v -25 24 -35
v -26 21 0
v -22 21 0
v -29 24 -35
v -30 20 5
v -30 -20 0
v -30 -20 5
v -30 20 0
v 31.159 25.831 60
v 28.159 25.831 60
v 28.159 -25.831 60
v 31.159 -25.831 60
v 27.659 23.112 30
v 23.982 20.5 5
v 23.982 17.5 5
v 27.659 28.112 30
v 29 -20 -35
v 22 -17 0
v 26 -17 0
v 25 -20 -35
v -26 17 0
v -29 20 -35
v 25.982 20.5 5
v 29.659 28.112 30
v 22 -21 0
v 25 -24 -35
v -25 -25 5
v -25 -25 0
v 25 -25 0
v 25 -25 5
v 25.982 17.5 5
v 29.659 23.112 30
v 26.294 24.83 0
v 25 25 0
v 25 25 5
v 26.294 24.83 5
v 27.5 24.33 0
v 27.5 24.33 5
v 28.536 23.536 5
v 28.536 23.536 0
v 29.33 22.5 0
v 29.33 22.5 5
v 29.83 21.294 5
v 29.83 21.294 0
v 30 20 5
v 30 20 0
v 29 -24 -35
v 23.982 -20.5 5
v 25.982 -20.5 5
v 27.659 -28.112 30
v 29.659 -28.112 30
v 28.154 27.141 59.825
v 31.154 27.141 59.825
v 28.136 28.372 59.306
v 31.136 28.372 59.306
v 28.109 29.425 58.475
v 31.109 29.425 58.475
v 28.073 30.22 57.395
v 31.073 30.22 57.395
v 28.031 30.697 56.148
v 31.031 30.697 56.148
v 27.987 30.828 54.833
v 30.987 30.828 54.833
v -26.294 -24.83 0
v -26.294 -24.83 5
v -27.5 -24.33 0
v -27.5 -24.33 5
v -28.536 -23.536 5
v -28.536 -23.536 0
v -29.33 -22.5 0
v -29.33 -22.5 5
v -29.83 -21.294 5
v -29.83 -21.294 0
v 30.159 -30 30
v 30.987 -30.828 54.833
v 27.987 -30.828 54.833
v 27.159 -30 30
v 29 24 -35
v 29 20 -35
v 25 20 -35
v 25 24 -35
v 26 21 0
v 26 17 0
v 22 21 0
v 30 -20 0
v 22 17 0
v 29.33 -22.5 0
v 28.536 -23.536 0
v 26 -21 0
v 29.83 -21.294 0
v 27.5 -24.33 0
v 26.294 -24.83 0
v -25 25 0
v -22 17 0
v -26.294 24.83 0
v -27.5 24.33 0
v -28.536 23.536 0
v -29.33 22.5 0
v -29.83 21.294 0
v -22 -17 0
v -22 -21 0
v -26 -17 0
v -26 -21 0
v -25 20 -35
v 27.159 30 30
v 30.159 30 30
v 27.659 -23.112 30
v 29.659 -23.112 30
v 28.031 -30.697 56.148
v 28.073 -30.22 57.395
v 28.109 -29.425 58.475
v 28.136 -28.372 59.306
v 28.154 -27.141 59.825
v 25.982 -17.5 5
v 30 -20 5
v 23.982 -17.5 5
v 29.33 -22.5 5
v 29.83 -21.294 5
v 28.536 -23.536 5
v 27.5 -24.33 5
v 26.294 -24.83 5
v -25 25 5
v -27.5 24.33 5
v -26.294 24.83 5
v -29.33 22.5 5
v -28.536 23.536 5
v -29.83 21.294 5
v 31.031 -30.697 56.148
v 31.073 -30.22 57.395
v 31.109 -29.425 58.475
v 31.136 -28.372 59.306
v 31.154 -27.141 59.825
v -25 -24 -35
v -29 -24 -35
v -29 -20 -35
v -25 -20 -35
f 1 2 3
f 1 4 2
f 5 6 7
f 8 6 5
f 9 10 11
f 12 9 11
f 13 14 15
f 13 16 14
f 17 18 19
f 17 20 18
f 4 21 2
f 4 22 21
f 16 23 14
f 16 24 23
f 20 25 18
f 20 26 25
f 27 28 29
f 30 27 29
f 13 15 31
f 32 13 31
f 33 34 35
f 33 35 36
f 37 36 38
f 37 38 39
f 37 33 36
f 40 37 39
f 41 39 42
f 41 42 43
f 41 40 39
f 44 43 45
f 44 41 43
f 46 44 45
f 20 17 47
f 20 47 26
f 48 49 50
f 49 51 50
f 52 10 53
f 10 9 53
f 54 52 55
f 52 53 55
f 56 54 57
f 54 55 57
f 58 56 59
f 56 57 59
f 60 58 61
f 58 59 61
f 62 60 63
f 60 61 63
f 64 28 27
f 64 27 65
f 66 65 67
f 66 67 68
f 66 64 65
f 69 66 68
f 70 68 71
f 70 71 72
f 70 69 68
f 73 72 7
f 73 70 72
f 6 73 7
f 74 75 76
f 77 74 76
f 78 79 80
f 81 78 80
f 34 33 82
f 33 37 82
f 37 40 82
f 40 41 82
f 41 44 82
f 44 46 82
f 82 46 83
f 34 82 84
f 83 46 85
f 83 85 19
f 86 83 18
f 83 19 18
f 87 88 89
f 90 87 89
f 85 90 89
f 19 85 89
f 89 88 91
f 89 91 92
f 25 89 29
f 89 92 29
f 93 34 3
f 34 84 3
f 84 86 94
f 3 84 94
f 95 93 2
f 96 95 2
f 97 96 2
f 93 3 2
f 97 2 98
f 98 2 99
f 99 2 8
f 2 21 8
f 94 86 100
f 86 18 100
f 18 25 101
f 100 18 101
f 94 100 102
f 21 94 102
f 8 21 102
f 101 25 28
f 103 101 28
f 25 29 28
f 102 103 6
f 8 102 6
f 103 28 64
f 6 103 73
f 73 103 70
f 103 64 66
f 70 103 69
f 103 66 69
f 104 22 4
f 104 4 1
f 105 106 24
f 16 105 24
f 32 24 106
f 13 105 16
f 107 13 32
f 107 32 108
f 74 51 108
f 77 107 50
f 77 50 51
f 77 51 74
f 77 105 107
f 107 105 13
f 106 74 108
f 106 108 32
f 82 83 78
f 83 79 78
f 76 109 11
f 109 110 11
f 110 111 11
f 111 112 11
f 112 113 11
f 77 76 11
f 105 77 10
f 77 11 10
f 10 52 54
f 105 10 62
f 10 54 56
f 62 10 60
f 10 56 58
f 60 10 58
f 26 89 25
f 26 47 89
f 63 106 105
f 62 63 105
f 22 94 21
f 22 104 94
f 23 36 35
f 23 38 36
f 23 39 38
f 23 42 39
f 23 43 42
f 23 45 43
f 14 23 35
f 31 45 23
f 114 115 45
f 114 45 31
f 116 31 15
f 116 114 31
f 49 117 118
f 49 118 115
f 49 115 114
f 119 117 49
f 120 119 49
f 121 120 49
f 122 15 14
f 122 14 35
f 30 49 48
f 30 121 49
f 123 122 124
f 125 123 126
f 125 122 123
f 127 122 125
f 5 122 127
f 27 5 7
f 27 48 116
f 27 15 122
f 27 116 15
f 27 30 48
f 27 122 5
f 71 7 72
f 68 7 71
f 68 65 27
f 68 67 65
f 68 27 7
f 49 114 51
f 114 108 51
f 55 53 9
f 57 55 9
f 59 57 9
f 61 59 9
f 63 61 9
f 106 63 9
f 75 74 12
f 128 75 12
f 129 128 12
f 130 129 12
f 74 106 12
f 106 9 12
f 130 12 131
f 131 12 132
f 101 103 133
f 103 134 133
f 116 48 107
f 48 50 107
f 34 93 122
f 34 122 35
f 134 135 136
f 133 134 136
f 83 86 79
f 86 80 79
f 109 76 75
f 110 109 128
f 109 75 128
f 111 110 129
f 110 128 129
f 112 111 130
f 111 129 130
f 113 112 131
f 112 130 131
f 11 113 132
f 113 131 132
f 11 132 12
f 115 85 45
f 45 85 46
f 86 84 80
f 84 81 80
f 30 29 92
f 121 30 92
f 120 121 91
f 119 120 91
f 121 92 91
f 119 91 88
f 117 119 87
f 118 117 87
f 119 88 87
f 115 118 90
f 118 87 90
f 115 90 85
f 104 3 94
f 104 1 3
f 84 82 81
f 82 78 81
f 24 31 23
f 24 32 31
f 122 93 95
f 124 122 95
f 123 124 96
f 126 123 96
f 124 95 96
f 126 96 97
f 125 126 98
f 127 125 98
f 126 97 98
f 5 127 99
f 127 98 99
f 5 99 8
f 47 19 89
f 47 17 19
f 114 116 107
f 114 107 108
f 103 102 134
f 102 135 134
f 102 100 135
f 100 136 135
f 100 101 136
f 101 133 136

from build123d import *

# Parameters (mm, degrees)
F1_DEPTH = 5
F2_W     = 4
F2_H     = 4
F4_W     = 4
F4_H     = 4
F7_W     = 2
F7_H     = 3
F9_W     = 2
F9_H     = 5
F11_W    = 3
F11_H    = 30
F13_W    = 3
F13_H    = 31
F16_R    = 5


with BuildPart() as f1:
    # F0 (on Top) → F1 (new body)
    with BuildSketch(Plane.XY):
        with BuildLine():
            Line((-30, 0), (0, 0))
            Line((0, 0), (0, 25))
            Line((0, 25), (-25, 25))
            ThreePointArc((-25, 25), (-28.5355339059, 23.5355339059), (-30, 20))
            Line((-30, 20), (-30, 0))
        make_face()
    extrude(amount=F1_DEPTH)

    # F2 (on face) → F5 section 0
    with BuildSketch(Plane(origin=(0, 0, 0), x_dir=(1, 0, 0), z_dir=(0, 0, -1))):
        with Locations((-24, -19)):
            Rectangle(F2_W, F2_H)
    # F4 (on offset) → F5 section 1
    with BuildSketch(Plane(origin=(0, 0, -35), x_dir=(1, 0, 0), z_dir=(0, 0, -1))):
        with Locations((-27, -22)):
            Rectangle(F4_W, F4_H)
    loft()

    # F6: F1 across plane


with BuildPart() as f1_1:
    add(f1.part)
    add(f1.part.mirror(Plane.YZ))

    # F7 (on face) → F10 section 0
    with BuildSketch(Plane.XY.offset(5)):
        with Locations((24.9823927879, 19)):
            Rectangle(F7_W, F7_H)
    # F9 (on offset) → F10 section 1
    with BuildSketch(Plane.XY.offset(30)):
        with Locations((28.6593784243, 25.6122151948)):
            Rectangle(F9_W, F9_H)
    loft()

    # F11 (on offset) → F14 section 0
    with BuildSketch(Plane.XY.offset(30)):
        with Locations((28.6593784243, 15)):
            Rectangle(F11_W, F11_H)
    # F13 (on offset) → F14 section 1
    with BuildSketch(Plane.XY.offset(60)):
        with Locations((29.6593784243, 15.5)):
            Rectangle(F13_W, F13_H)
    loft()

    # F15: F1 across plane


with BuildPart() as f1_2:
    add(f1_1.part)
    add(f1_1.part.mirror(Plane.XZ))

    # F16
    f16_edges = [f1_2.edges().sort_by_distance(p)[0] for p in [
        (29.659378, 31, 60),
        (29.659378, -31, 60),
    ]]
    fillet(f16_edges, radius=F16_R)

    # F17: F1 across plane


with BuildPart() as f1_3:
    add(f1_2.part)
    add(f1_2.part.mirror(Plane.XZ))


solid = f1_3.part
